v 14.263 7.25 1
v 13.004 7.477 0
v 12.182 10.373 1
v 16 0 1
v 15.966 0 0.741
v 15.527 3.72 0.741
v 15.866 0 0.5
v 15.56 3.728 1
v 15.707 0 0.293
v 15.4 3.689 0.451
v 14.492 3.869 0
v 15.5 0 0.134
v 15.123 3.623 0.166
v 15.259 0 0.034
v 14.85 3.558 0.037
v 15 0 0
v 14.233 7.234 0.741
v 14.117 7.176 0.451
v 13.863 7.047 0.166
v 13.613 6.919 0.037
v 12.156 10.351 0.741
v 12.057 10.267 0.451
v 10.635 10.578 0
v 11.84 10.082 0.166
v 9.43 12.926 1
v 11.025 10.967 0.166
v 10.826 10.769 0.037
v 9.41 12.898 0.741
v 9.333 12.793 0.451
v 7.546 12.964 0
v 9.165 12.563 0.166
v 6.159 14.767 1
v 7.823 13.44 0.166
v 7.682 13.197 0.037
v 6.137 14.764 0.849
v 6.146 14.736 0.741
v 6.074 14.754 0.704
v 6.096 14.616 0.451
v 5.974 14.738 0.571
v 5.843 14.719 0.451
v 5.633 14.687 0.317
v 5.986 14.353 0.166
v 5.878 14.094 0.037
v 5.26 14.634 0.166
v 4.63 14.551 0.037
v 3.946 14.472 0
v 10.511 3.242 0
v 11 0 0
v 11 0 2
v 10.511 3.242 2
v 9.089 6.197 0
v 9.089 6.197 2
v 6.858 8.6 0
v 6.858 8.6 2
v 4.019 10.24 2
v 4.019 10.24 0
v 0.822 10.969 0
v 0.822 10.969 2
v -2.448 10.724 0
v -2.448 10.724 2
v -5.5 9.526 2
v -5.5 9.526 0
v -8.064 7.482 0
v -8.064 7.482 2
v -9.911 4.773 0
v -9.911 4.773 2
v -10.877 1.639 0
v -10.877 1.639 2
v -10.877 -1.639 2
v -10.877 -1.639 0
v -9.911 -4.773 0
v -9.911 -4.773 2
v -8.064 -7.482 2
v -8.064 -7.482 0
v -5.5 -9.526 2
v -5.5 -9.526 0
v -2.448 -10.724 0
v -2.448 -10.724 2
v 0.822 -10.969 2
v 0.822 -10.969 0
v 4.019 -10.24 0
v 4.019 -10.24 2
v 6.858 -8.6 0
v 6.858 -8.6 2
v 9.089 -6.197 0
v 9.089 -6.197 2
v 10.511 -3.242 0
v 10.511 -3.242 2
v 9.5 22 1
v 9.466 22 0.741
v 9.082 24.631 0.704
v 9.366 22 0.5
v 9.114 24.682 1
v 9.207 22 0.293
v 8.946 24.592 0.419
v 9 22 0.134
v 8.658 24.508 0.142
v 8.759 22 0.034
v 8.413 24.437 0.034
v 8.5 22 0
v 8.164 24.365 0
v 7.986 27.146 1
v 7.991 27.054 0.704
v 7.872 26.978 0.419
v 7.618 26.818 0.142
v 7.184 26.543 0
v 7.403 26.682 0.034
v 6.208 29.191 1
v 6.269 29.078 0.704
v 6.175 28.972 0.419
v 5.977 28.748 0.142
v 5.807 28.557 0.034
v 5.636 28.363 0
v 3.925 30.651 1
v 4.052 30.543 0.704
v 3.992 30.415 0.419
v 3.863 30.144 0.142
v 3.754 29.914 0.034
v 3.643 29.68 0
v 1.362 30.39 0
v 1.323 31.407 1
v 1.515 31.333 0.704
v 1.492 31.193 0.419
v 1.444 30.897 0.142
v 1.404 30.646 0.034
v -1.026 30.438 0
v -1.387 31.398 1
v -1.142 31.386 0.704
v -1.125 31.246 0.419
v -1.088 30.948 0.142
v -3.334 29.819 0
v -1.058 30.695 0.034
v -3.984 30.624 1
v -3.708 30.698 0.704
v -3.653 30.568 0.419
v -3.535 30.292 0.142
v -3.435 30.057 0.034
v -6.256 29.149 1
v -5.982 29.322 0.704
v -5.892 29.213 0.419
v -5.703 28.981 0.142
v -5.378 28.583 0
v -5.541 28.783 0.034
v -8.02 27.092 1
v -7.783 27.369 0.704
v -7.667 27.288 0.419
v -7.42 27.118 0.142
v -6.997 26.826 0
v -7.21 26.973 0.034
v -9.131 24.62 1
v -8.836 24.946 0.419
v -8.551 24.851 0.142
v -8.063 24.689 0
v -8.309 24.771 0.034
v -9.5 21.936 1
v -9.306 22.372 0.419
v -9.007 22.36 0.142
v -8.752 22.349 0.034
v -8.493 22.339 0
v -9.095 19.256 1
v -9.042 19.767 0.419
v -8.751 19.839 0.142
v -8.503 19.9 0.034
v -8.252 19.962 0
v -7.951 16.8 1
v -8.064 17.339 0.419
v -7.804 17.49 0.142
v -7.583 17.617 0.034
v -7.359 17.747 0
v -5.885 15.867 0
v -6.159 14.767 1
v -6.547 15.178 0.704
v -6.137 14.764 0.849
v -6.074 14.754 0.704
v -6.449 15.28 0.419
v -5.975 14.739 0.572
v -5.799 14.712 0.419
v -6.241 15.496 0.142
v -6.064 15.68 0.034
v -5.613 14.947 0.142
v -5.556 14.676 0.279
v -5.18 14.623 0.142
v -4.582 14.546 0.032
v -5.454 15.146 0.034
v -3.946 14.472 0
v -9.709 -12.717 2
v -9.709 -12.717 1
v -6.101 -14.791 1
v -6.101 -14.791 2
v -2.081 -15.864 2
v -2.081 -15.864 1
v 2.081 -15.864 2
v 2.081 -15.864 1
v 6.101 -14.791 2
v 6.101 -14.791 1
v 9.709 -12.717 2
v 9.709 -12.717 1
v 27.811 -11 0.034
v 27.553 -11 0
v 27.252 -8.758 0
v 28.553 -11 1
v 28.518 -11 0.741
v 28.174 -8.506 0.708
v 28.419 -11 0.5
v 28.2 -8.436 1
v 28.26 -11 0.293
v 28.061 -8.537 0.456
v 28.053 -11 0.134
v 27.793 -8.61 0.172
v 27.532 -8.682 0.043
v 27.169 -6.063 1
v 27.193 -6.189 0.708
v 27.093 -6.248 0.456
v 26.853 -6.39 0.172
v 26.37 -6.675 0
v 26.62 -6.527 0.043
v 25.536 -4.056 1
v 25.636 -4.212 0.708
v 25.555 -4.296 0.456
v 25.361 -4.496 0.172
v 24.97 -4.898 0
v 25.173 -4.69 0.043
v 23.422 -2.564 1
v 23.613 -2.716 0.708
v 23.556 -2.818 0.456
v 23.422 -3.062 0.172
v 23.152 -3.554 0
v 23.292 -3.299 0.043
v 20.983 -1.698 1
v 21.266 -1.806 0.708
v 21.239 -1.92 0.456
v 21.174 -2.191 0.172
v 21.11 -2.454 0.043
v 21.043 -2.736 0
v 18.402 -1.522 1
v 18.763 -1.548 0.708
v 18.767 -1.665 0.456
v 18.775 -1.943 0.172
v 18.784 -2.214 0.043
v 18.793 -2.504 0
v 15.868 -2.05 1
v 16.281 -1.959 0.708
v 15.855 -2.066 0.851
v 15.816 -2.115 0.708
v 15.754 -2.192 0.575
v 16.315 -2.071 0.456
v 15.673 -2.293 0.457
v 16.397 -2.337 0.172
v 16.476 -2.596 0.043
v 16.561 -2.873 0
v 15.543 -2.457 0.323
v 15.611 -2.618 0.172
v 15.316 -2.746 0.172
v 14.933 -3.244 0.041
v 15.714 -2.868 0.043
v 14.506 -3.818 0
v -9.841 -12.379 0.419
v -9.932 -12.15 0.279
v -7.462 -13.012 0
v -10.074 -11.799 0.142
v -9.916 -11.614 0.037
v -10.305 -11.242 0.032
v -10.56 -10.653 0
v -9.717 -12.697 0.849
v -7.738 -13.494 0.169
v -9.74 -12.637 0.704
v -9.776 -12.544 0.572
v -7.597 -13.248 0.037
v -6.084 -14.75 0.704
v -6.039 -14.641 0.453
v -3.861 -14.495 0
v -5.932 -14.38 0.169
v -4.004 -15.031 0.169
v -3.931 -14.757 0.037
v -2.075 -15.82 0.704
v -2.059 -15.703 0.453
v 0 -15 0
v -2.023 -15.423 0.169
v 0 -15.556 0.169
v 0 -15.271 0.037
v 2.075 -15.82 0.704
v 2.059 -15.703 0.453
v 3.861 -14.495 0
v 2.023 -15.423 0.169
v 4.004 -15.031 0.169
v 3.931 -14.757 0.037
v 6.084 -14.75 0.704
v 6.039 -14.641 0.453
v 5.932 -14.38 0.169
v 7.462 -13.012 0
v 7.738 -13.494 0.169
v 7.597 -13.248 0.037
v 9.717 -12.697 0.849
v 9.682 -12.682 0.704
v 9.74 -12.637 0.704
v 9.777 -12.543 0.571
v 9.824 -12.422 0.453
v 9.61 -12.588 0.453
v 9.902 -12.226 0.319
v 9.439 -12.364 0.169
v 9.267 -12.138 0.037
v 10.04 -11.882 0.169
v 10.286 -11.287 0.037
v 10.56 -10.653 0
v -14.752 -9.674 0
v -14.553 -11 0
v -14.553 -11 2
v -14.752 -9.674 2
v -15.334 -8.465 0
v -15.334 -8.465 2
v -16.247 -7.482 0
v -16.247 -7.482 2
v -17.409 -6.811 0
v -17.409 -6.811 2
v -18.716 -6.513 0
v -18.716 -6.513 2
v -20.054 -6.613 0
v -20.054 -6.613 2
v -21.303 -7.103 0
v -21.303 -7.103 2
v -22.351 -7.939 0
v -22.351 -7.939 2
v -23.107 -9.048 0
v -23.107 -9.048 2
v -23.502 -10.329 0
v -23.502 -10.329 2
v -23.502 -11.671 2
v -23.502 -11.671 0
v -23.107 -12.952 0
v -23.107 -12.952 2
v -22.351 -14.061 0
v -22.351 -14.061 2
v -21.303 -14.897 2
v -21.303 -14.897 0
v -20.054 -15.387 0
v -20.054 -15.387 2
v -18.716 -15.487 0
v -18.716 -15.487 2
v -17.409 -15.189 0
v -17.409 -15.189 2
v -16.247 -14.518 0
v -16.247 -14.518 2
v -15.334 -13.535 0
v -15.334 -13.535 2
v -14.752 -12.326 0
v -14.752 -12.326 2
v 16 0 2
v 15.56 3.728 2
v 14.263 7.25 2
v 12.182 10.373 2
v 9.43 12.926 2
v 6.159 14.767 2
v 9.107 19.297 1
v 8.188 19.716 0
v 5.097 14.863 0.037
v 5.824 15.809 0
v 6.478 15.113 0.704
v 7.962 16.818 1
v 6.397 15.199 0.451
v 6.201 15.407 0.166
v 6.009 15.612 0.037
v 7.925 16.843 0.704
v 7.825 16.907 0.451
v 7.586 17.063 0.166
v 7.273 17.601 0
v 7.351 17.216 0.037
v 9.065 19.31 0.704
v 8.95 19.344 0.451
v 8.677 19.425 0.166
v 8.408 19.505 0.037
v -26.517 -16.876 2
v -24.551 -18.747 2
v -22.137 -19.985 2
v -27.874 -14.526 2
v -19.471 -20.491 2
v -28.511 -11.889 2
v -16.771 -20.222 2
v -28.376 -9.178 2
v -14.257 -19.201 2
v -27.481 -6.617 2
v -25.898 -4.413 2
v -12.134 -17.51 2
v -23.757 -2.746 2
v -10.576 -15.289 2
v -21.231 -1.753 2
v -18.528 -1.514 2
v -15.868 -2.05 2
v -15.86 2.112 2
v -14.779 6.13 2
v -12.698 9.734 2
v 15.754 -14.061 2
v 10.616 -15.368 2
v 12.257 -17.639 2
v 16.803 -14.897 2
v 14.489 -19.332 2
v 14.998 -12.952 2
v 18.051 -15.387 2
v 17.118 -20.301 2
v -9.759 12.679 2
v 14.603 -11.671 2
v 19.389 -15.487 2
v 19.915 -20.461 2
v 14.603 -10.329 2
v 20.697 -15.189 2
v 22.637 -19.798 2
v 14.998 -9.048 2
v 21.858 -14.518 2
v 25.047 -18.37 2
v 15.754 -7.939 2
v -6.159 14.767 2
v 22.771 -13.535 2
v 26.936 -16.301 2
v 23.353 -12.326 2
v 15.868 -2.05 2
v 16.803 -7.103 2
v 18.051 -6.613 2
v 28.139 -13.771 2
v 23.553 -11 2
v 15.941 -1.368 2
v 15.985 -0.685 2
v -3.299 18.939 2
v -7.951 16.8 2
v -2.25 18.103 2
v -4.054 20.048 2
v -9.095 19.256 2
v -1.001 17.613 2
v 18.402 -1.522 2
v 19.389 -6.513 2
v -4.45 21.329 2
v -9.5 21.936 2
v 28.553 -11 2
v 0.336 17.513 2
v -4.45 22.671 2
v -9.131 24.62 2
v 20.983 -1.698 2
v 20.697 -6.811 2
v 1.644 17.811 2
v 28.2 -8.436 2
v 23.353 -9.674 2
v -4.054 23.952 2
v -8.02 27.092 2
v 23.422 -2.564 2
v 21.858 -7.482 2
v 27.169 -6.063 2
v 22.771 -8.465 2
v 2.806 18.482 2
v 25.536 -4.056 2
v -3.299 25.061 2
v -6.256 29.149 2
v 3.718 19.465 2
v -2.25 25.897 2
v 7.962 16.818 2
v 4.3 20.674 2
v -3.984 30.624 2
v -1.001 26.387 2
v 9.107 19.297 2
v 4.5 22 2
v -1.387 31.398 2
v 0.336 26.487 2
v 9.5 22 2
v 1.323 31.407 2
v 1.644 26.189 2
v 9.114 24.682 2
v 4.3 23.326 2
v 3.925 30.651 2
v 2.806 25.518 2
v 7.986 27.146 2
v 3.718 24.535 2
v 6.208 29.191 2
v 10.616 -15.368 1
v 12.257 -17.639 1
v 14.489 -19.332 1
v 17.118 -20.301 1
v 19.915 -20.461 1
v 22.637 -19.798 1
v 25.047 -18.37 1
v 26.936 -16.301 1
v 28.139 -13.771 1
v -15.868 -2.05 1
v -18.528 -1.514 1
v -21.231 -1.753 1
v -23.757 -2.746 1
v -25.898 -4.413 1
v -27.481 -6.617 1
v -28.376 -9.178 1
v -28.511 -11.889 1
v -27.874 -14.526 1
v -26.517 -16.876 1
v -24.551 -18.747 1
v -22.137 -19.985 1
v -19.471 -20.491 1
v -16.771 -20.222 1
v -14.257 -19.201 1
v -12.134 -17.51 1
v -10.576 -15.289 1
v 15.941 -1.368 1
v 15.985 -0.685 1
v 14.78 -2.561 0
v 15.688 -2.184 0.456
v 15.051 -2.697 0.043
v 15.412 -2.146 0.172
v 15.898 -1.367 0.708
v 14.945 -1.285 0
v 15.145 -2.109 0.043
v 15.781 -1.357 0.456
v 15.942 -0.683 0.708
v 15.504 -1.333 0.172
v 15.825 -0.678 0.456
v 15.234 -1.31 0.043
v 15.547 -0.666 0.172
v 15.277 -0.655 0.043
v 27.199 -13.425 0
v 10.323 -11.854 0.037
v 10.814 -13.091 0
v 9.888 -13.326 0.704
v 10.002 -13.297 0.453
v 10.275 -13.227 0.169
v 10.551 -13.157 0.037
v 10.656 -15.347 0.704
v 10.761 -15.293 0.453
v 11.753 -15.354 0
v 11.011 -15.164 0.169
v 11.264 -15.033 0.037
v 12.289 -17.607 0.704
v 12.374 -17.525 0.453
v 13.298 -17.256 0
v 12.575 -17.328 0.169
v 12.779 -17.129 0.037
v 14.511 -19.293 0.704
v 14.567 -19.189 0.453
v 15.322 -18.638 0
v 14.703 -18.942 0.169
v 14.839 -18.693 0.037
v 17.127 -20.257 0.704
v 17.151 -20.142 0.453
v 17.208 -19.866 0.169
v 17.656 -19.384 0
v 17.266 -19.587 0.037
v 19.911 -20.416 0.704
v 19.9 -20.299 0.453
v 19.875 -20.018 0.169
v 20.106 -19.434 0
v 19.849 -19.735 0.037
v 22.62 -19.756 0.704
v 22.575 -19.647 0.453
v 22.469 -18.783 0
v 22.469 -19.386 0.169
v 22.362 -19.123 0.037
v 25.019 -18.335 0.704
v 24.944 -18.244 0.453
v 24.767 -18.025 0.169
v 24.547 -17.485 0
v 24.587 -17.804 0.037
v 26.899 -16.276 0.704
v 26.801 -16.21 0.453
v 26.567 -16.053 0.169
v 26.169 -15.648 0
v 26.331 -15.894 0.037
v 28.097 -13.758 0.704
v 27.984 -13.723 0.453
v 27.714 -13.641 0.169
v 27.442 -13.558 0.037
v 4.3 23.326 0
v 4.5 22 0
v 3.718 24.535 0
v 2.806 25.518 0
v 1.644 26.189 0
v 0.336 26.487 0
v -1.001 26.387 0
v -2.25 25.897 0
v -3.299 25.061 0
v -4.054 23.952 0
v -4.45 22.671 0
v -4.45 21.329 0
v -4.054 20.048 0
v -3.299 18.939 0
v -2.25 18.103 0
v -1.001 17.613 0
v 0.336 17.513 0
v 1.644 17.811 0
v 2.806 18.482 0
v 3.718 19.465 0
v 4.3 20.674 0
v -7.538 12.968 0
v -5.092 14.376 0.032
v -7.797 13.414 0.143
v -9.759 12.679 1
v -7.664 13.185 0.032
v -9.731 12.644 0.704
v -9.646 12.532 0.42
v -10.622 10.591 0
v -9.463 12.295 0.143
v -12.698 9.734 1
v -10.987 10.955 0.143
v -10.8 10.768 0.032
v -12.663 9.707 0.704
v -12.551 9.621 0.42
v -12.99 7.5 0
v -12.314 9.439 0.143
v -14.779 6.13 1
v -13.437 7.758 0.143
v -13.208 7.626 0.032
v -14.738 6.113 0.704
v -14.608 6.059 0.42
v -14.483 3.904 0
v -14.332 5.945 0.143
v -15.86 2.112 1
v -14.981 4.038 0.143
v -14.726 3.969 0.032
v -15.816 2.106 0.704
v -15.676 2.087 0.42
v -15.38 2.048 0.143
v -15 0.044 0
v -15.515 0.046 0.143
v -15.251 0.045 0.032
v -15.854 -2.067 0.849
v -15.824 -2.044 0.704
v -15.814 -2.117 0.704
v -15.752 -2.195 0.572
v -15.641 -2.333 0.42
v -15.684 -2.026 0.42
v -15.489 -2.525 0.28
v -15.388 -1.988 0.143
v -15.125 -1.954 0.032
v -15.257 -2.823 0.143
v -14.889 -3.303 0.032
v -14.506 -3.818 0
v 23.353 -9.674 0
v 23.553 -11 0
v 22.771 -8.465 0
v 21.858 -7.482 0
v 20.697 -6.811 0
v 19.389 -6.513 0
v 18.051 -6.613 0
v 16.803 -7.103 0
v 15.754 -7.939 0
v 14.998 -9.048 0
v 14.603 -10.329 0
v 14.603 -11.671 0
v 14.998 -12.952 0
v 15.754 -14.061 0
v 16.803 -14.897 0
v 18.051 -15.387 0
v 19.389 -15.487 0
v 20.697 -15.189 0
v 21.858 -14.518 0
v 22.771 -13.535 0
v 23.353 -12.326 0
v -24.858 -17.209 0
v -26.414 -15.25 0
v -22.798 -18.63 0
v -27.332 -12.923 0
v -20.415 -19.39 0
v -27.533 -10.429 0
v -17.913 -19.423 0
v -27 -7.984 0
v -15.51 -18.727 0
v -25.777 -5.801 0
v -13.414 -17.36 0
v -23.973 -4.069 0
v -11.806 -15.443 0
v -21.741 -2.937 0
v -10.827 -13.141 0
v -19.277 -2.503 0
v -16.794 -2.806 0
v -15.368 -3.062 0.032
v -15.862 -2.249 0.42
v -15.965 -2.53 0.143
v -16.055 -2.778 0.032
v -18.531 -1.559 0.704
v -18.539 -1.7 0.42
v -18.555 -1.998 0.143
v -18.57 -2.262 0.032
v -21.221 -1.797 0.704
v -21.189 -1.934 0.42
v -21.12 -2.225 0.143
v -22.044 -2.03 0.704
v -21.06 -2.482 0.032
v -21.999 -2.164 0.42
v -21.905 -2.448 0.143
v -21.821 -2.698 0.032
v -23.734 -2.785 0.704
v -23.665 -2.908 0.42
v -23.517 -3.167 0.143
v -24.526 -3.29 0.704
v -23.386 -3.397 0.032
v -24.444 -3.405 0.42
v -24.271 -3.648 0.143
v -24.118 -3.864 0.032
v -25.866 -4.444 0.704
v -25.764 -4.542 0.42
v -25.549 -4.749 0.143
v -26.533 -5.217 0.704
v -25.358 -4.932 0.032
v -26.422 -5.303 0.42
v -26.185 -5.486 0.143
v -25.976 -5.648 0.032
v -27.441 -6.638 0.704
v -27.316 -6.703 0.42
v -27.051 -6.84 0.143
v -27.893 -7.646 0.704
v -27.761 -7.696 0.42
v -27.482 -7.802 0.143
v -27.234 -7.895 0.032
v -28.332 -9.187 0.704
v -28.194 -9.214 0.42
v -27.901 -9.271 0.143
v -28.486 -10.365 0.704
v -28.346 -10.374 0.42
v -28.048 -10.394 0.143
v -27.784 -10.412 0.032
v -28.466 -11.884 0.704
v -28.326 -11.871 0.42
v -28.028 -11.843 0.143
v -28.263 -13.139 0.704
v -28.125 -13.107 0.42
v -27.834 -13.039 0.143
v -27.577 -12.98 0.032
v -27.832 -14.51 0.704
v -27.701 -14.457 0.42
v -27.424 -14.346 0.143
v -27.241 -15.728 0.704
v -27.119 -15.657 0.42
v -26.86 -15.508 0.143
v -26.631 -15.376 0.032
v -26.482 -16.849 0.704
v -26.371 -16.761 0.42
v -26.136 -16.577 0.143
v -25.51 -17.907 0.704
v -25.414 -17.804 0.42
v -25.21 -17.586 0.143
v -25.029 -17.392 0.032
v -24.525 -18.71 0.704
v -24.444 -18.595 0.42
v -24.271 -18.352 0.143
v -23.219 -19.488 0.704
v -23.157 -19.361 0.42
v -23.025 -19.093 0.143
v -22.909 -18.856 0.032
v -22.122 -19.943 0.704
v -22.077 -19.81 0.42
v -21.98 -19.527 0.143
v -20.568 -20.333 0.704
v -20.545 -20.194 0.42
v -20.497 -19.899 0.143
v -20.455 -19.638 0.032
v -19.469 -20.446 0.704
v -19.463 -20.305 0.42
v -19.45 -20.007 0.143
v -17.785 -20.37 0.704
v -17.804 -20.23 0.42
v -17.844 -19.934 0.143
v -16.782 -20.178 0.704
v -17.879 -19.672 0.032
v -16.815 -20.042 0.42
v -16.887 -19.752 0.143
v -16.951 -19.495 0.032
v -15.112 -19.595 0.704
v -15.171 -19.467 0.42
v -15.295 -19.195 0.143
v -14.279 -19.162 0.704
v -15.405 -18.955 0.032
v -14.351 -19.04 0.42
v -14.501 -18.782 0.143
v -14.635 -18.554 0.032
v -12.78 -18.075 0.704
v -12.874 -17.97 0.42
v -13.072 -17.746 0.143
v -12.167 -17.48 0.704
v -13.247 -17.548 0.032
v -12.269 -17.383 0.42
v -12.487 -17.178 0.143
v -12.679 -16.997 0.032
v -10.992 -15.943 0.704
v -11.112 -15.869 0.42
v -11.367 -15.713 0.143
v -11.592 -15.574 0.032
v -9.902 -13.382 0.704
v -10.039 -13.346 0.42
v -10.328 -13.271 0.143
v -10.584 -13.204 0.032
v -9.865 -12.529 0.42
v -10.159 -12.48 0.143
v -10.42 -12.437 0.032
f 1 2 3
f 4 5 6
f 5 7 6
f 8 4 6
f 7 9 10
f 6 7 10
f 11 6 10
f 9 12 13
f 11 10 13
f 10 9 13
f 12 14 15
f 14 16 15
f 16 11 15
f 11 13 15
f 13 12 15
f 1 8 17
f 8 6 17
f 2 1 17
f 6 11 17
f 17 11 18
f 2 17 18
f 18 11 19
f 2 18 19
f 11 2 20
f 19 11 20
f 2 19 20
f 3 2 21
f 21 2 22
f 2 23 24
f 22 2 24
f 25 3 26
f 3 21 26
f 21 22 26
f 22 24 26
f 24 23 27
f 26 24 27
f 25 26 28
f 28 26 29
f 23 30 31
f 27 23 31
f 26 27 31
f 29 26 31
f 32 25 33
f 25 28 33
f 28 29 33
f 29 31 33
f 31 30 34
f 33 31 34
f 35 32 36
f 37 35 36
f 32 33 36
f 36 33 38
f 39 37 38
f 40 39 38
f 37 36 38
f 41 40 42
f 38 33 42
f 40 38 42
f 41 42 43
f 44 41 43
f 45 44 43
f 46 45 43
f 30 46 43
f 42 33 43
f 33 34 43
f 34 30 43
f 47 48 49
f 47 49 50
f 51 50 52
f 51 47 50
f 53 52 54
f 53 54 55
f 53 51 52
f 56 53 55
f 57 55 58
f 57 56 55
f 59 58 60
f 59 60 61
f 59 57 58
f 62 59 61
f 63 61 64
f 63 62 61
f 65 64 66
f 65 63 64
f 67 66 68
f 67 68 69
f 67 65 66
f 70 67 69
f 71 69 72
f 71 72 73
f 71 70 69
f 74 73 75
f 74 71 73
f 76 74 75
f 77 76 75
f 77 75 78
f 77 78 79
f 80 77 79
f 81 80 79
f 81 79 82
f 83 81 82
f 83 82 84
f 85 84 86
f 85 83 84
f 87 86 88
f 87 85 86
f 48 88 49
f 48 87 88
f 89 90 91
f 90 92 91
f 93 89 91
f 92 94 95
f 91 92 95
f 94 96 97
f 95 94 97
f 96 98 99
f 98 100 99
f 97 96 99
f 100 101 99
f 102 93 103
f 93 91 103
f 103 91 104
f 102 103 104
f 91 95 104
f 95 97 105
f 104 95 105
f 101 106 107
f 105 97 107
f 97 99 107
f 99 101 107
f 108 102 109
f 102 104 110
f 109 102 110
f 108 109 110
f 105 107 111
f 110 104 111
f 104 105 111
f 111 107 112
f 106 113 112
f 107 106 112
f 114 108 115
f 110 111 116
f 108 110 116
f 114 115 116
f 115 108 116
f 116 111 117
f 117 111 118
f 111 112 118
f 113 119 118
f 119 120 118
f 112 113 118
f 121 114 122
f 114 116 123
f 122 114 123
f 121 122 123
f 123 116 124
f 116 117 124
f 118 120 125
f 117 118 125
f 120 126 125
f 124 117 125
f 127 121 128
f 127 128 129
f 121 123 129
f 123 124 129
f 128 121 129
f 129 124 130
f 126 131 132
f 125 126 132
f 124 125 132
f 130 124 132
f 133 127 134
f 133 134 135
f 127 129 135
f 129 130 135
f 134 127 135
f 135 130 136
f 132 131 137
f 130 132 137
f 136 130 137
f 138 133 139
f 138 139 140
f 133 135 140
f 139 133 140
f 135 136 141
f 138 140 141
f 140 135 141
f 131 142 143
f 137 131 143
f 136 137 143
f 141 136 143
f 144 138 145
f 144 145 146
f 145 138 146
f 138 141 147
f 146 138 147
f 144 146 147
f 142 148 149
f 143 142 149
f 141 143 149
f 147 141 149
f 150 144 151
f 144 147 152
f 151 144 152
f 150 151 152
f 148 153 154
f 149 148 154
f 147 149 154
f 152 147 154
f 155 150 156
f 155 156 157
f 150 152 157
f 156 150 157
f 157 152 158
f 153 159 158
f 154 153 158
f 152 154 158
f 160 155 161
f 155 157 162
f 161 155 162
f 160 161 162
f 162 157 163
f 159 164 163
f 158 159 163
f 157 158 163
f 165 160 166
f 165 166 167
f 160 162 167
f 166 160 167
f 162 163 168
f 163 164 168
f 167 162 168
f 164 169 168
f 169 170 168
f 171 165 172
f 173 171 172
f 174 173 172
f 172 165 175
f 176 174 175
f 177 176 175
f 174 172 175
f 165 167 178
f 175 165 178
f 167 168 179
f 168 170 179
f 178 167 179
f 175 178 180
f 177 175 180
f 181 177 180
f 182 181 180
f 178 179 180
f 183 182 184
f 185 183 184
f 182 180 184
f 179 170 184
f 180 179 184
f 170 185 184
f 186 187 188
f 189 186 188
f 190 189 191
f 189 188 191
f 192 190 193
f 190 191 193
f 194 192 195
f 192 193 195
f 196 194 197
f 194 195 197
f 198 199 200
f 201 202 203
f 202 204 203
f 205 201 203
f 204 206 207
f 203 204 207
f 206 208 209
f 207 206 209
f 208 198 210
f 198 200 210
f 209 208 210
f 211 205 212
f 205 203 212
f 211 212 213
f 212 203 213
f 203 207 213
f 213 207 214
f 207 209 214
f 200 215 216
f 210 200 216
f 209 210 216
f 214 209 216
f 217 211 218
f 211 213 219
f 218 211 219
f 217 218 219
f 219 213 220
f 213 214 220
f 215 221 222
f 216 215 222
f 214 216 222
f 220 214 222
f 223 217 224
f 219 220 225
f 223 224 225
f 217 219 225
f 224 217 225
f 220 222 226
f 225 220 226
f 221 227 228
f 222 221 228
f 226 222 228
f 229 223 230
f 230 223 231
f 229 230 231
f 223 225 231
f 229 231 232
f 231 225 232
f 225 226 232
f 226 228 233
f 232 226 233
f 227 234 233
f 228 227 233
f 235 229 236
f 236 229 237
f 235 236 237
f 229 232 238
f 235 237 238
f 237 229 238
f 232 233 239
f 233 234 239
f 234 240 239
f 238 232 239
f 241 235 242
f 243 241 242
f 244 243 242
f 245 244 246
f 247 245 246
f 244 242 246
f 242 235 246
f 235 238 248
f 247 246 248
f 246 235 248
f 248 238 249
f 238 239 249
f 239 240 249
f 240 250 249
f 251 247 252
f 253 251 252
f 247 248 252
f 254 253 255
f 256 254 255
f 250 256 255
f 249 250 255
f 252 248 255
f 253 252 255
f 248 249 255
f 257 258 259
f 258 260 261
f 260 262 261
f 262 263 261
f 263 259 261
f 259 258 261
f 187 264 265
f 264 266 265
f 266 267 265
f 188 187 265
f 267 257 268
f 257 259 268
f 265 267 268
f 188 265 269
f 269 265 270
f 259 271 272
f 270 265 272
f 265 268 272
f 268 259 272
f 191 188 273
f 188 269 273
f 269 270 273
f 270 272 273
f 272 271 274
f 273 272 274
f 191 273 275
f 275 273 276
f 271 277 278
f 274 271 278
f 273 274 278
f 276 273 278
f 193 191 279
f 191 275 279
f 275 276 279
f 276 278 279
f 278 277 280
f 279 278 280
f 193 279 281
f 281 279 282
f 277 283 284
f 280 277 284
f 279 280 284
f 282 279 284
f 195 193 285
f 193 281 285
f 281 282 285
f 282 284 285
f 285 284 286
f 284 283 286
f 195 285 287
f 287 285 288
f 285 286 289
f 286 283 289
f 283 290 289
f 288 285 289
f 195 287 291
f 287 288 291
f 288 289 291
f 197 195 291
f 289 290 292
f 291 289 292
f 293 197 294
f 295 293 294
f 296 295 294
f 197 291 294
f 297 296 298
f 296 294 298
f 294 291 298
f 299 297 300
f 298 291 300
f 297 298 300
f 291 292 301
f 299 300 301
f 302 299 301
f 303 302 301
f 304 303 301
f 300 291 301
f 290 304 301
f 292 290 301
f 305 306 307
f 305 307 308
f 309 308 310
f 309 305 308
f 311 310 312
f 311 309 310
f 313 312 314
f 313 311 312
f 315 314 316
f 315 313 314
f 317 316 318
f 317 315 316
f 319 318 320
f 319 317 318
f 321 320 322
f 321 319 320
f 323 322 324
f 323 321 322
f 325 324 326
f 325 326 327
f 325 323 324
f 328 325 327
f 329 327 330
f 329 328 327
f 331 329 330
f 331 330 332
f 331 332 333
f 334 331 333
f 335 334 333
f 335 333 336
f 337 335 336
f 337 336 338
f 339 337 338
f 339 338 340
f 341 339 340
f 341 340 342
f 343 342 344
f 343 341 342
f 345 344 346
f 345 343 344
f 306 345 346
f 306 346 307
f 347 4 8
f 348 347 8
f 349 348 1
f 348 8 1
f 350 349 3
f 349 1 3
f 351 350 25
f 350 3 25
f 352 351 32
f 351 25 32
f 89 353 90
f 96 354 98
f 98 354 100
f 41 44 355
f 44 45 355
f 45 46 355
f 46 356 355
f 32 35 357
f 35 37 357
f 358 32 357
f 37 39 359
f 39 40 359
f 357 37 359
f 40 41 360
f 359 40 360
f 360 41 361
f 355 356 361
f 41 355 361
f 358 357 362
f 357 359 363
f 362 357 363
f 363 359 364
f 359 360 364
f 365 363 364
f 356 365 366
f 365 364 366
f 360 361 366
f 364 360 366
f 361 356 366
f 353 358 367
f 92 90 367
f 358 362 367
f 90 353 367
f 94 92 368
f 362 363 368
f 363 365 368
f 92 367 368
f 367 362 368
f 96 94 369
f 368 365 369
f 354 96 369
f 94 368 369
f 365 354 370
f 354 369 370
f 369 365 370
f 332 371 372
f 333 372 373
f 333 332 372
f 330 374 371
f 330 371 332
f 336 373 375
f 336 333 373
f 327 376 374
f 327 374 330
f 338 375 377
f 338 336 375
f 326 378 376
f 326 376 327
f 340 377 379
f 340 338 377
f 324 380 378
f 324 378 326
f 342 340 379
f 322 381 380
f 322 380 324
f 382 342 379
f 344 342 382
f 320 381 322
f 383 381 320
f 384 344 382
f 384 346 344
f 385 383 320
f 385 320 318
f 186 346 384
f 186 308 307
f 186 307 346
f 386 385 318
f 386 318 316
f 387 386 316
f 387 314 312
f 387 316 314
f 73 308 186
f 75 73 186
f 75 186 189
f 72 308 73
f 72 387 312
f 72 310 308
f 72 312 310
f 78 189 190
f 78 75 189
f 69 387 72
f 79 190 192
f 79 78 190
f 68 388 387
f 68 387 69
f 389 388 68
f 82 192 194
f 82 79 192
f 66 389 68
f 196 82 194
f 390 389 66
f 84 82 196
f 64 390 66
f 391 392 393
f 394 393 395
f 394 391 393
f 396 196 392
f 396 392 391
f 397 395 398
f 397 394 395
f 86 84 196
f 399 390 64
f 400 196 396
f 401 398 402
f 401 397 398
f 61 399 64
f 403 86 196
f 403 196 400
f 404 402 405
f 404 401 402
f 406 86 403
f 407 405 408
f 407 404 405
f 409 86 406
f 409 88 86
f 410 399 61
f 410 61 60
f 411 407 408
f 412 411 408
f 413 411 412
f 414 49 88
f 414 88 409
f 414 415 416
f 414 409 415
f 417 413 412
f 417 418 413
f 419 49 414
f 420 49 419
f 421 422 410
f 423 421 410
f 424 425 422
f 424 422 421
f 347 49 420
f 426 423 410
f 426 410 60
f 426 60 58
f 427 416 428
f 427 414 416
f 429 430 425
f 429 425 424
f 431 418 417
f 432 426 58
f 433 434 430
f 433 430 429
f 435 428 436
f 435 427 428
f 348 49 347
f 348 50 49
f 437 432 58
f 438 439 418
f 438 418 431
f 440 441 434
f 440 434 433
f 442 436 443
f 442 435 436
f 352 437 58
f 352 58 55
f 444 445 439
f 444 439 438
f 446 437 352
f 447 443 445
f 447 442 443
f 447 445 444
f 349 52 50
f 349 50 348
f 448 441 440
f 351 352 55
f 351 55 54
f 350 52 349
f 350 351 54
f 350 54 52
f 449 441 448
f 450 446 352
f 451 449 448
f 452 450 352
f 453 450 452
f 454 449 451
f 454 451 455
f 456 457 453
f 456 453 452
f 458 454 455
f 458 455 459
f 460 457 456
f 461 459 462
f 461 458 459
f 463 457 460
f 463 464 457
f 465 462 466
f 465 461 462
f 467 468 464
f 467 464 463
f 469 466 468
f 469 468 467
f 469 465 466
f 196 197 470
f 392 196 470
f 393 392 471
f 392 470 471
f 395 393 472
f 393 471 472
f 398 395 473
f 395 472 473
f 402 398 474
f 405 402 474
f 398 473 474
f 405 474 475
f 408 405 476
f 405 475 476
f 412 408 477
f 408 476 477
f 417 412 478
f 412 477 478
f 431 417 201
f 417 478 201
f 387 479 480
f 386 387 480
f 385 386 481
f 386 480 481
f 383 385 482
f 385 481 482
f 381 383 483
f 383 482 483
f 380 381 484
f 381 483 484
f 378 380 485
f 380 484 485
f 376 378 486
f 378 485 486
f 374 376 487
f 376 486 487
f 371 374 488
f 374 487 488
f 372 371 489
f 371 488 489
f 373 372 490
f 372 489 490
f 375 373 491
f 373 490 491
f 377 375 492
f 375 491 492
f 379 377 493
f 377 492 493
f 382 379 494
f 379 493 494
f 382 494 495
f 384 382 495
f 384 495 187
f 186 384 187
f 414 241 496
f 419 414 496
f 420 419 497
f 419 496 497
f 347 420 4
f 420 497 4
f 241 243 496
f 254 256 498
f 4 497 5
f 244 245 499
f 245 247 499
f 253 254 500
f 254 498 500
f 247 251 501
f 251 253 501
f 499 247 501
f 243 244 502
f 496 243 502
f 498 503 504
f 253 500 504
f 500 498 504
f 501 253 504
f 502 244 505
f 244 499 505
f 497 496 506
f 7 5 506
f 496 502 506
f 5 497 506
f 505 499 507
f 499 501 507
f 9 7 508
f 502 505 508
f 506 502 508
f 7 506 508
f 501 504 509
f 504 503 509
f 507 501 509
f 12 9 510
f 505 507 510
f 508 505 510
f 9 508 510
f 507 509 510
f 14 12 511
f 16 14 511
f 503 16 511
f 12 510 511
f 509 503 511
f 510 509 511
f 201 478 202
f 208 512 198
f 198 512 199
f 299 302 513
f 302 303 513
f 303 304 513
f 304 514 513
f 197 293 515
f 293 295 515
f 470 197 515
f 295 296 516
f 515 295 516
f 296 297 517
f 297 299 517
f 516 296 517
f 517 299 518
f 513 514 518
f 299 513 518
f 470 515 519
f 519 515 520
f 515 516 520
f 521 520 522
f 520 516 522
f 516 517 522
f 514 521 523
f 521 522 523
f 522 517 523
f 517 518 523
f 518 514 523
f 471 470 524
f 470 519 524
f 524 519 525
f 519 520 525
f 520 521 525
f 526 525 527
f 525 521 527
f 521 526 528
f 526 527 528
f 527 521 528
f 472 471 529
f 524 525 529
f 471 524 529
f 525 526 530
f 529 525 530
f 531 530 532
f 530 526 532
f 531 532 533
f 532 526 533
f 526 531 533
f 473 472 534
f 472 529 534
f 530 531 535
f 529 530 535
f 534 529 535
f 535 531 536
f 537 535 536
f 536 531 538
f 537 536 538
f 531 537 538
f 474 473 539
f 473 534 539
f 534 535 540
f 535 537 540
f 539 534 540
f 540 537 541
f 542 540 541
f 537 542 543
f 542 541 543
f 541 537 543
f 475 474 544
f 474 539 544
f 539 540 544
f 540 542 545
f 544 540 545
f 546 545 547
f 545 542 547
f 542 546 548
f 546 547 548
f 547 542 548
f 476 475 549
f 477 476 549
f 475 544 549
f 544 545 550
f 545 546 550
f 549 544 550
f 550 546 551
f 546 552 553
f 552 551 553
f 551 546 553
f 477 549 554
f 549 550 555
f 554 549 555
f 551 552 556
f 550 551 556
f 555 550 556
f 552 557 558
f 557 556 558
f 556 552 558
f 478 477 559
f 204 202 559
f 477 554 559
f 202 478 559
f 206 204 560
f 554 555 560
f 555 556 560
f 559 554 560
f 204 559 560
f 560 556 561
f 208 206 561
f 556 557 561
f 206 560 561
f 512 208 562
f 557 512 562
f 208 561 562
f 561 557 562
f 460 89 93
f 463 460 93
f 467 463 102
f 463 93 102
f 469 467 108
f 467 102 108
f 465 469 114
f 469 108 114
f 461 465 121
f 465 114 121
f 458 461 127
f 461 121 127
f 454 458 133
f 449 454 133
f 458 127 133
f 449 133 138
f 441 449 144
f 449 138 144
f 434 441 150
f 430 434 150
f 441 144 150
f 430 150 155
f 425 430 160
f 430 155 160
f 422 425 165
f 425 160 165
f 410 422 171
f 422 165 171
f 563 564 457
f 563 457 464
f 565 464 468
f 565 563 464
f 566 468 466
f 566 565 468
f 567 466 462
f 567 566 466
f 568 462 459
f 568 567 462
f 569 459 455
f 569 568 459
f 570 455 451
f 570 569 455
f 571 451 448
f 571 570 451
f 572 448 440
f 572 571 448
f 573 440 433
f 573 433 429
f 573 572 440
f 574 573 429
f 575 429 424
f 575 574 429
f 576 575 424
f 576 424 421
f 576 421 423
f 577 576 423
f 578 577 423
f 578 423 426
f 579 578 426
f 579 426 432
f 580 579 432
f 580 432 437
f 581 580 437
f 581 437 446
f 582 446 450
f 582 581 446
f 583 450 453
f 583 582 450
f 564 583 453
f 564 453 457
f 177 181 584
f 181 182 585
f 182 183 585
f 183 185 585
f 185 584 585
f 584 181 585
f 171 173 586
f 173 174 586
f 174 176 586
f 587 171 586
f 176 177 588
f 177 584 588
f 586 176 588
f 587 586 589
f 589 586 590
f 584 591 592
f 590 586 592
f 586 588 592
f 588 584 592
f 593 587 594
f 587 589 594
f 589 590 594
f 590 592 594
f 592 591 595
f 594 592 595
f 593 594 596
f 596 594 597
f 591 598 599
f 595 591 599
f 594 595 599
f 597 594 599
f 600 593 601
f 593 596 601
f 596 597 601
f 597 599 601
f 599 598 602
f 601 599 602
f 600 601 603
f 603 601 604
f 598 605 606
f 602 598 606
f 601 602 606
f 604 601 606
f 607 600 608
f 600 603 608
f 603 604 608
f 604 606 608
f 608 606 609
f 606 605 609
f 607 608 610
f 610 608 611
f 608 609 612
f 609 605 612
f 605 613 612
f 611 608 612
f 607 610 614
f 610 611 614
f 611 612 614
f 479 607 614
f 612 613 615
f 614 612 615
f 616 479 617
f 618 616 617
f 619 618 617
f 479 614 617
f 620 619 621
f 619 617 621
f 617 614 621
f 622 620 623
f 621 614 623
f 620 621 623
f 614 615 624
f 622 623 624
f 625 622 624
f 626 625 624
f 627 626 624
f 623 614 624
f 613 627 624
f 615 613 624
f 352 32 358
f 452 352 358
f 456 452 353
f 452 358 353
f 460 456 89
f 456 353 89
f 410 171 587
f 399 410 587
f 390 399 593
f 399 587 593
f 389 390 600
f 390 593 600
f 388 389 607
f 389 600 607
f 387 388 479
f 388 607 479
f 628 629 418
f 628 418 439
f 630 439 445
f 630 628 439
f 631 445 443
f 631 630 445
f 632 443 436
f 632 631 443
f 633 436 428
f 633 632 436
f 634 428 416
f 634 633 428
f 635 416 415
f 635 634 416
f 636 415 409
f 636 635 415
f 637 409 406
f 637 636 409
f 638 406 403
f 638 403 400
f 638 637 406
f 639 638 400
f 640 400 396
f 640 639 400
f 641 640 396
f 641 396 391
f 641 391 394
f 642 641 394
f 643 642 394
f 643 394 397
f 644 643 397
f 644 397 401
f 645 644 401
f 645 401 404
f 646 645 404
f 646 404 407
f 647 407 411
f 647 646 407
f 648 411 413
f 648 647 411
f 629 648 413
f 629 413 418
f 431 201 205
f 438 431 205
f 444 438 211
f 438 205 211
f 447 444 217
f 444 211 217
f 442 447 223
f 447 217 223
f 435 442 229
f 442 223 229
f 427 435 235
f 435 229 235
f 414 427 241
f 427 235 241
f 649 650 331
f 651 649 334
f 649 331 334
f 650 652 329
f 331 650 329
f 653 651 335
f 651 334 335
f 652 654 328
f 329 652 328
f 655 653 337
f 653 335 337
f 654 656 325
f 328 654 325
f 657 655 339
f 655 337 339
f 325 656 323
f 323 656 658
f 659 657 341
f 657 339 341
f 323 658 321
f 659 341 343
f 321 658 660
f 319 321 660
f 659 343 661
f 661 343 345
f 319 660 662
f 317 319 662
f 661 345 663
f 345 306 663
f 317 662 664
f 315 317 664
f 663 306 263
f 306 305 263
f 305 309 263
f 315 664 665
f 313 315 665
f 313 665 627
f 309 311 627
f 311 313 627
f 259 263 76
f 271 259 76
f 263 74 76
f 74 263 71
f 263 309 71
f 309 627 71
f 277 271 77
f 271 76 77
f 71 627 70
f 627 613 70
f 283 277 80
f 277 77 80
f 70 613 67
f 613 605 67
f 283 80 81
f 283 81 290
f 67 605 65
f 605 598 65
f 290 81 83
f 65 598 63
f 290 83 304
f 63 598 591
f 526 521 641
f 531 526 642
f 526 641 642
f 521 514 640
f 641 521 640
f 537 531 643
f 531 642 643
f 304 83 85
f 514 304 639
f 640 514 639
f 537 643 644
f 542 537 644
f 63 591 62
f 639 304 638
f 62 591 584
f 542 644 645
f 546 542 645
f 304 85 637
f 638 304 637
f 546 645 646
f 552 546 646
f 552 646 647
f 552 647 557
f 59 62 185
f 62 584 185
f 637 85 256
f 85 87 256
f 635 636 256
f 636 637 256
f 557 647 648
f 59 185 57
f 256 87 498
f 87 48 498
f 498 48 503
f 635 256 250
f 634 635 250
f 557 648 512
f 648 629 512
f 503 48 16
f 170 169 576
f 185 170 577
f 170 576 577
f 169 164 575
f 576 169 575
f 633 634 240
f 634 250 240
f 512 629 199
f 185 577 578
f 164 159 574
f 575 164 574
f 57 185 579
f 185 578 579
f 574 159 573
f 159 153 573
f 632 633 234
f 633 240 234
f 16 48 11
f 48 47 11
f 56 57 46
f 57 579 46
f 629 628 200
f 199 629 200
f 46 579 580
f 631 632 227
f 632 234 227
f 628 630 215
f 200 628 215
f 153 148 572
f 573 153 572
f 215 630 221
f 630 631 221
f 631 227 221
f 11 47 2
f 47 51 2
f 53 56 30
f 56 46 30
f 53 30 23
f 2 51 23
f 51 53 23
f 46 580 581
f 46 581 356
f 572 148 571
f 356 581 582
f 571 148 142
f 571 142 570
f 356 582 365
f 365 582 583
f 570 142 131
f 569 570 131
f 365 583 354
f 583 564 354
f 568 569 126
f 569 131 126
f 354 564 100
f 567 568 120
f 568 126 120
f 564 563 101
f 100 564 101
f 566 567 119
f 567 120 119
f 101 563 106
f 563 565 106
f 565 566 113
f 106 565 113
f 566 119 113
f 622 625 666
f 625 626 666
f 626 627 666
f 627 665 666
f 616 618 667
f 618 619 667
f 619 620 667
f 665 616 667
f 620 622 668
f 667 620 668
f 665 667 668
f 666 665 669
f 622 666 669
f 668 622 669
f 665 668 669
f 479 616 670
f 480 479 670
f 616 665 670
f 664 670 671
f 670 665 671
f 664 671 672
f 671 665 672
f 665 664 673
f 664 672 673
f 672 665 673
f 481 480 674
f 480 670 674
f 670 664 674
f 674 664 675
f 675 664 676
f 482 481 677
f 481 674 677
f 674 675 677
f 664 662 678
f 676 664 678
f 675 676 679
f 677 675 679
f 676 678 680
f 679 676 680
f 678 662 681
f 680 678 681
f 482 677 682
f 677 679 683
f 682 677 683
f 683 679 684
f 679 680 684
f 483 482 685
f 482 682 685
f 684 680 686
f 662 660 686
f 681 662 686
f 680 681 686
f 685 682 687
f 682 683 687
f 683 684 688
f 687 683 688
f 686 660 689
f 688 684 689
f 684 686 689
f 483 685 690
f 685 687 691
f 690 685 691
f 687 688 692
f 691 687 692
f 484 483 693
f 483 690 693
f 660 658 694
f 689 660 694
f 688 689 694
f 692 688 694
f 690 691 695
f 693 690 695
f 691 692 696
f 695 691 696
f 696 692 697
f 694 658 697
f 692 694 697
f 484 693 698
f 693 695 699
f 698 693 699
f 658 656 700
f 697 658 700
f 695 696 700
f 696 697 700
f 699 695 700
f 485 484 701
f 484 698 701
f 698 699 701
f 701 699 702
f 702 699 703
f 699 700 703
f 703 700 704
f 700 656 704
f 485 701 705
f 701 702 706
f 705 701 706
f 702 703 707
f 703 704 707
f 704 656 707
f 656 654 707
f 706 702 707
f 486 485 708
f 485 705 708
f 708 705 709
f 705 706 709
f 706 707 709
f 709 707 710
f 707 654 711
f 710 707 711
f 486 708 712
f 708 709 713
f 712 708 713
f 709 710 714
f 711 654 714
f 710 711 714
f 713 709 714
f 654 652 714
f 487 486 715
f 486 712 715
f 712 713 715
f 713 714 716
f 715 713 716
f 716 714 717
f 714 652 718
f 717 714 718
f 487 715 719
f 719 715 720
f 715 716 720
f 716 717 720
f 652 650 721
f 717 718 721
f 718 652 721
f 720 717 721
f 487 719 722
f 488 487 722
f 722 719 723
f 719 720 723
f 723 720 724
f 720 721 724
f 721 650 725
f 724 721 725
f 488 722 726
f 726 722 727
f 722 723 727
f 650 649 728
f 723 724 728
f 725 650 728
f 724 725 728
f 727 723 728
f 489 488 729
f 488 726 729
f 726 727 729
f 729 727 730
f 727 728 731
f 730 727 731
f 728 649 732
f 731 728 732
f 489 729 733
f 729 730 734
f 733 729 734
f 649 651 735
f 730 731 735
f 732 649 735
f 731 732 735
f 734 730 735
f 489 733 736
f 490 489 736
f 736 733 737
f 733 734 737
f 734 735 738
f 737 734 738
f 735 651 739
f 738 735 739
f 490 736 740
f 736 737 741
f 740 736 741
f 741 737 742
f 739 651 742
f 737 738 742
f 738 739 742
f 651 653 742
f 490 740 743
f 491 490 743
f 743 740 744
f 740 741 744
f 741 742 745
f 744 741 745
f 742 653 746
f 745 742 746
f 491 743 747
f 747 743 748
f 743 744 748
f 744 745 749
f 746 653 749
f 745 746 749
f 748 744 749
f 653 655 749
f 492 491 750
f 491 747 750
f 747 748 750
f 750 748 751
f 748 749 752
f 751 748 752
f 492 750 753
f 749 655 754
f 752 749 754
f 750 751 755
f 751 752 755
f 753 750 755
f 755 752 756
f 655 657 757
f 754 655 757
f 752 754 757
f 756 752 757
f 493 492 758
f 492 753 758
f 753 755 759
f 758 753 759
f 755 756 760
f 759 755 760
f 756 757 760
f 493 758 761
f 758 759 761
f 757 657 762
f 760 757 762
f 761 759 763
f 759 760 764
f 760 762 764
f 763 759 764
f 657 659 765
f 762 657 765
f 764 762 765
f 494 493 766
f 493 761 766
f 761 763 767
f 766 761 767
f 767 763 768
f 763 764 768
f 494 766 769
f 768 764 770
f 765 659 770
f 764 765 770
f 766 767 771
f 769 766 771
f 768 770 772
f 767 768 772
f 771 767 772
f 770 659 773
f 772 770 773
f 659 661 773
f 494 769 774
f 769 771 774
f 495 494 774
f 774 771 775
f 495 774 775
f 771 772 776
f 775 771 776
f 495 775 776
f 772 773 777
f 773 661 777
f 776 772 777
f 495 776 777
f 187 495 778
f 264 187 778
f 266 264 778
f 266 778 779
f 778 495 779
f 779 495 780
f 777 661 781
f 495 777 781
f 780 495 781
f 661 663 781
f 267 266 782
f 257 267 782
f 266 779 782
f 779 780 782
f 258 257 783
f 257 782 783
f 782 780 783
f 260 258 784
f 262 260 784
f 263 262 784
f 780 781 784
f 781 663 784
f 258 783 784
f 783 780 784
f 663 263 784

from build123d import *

# Parameters (mm, degrees)
F0_R     = 4.500000108
F0_R_2   = 11
F1_DEPTH = 2
F2_R     = 1


with BuildPart() as f1:
    # F0 (on Top) → F1 (new body)
    with BuildSketch(Plane.XY):
        with BuildLine():
            ThreePointArc((6.1590883621, 14.7670455174), (8.624422863, 18.0163672007), (9.5, 22))
            ThreePointArc((9.5, 22), (-3.9836327993, 30.624422863), (-6.1590883621, 14.7670455174))
            ThreePointArc((-6.1590883621, 14.7670455174), (0, 16.0000000864), (6.1590883621, 14.7670455174))
        make_face()
        with Locations((0, 22)):
            Circle(F0_R, mode=Mode.SUBTRACT)
        with BuildLine():
            ThreePointArc((6.1590883621, 14.7670455174), (0, 16.0000000864), (-6.1590883621, 14.7670455174))
            ThreePointArc((-6.1590883621, 14.7670455174), (0, 12.5), (6.1590883621, 14.7670455174))
        make_face()
        with BuildLine():
            ThreePointArc((6.1590883621, 14.7670455174), (0, 12.5), (-6.1590883621, 14.7670455174))
            ThreePointArc((-6.1590883621, 14.7670455174), (-13.8564065354, 8.0000000432), (-15.868180738, -2.0495957729))
            ThreePointArc((-15.868180738, -2.0495957729), (-11.2904202482, -5.5228471073), (-9.5525588833, -11))
            ThreePointArc((-9.5525588833, -11), (-9.5917731912, -11.8622842279), (-9.7090923758, -12.7174497444))
            ThreePointArc((-9.7090923758, -12.7174497444), (0, -16.0000000864), (9.7090923758, -12.7174497444))
            ThreePointArc((9.7090923758, -12.7174497444), (10.8253175473, -6.25), (15.868180738, -2.0495957729))
            ThreePointArc((15.868180738, -2.0495957729), (15.967011241, -1.0269151831), (16.0000000864, 0))
            ThreePointArc((16.0000000864, 0), (13.3143797657, 8.8728402566), (6.1590883621, 14.7670455174))
        make_face()
        Circle(F0_R_2, mode=Mode.SUBTRACT)
        with BuildLine():
            ThreePointArc((-9.7090923758, -12.7174497444), (-13.8564065354, -8.0000000432), (-15.868180738, -2.0495957729))
            ThreePointArc((-15.868180738, -2.0495957729), (-27.2798002192, -15.75), (-9.7090923758, -12.7174497444))
        make_face()
        with Locations((-19.0525588833, -11)):
            Circle(F0_R, mode=Mode.SUBTRACT)
        with BuildLine():
            ThreePointArc((-9.5525588833, -11), (-11.2904202482, -5.5228471073), (-15.868180738, -2.0495957729))
            ThreePointArc((-15.868180738, -2.0495957729), (-13.8564065354, -8.0000000432), (-9.7090923758, -12.7174497444))
            ThreePointArc((-9.7090923758, -12.7174497444), (-9.5917731912, -11.8622842279), (-9.5525588833, -11))
        make_face()
        with BuildLine():
            ThreePointArc((9.7090923758, -12.7174497444), (13.8564065354, -8.0000000432), (15.868180738, -2.0495957729))
            ThreePointArc((15.868180738, -2.0495957729), (10.8253175473, -6.25), (9.7090923758, -12.7174497444))
        make_face()
        with BuildLine():
            ThreePointArc((28.5525588833, -11), (24.5297117759, -3.2378613649), (15.868180738, -2.0495957729))
            ThreePointArc((15.868180738, -2.0495957729), (13.8564065354, -8.0000000432), (9.7090923758, -12.7174497444))
            ThreePointArc((9.7090923758, -12.7174497444), (19.9148431112, -20.460785692), (28.5525588833, -11))
        make_face()
        with Locations((19.0525588833, -11)):
            Circle(F0_R, mode=Mode.SUBTRACT)
    extrude(amount=F1_DEPTH)

    # F2
    f2_edges = [f1.edges().sort_by_distance(p)[0] for p in [
        (-27.2798, -15.75, 0),
        (0, -16, 0),
        (27.2798, -15.75, 0),
        (13.856407, 8, 0),
        (0, 31.5, 0),
        (-13.856407, 8, 0),
    ]]
    fillet(f2_edges, radius=F2_R)


with BuildPart() as f3_1:
    # F3: copy of F1
    add(f1.part.moved(Location((0, 0, 10))))


solid = f1.part
